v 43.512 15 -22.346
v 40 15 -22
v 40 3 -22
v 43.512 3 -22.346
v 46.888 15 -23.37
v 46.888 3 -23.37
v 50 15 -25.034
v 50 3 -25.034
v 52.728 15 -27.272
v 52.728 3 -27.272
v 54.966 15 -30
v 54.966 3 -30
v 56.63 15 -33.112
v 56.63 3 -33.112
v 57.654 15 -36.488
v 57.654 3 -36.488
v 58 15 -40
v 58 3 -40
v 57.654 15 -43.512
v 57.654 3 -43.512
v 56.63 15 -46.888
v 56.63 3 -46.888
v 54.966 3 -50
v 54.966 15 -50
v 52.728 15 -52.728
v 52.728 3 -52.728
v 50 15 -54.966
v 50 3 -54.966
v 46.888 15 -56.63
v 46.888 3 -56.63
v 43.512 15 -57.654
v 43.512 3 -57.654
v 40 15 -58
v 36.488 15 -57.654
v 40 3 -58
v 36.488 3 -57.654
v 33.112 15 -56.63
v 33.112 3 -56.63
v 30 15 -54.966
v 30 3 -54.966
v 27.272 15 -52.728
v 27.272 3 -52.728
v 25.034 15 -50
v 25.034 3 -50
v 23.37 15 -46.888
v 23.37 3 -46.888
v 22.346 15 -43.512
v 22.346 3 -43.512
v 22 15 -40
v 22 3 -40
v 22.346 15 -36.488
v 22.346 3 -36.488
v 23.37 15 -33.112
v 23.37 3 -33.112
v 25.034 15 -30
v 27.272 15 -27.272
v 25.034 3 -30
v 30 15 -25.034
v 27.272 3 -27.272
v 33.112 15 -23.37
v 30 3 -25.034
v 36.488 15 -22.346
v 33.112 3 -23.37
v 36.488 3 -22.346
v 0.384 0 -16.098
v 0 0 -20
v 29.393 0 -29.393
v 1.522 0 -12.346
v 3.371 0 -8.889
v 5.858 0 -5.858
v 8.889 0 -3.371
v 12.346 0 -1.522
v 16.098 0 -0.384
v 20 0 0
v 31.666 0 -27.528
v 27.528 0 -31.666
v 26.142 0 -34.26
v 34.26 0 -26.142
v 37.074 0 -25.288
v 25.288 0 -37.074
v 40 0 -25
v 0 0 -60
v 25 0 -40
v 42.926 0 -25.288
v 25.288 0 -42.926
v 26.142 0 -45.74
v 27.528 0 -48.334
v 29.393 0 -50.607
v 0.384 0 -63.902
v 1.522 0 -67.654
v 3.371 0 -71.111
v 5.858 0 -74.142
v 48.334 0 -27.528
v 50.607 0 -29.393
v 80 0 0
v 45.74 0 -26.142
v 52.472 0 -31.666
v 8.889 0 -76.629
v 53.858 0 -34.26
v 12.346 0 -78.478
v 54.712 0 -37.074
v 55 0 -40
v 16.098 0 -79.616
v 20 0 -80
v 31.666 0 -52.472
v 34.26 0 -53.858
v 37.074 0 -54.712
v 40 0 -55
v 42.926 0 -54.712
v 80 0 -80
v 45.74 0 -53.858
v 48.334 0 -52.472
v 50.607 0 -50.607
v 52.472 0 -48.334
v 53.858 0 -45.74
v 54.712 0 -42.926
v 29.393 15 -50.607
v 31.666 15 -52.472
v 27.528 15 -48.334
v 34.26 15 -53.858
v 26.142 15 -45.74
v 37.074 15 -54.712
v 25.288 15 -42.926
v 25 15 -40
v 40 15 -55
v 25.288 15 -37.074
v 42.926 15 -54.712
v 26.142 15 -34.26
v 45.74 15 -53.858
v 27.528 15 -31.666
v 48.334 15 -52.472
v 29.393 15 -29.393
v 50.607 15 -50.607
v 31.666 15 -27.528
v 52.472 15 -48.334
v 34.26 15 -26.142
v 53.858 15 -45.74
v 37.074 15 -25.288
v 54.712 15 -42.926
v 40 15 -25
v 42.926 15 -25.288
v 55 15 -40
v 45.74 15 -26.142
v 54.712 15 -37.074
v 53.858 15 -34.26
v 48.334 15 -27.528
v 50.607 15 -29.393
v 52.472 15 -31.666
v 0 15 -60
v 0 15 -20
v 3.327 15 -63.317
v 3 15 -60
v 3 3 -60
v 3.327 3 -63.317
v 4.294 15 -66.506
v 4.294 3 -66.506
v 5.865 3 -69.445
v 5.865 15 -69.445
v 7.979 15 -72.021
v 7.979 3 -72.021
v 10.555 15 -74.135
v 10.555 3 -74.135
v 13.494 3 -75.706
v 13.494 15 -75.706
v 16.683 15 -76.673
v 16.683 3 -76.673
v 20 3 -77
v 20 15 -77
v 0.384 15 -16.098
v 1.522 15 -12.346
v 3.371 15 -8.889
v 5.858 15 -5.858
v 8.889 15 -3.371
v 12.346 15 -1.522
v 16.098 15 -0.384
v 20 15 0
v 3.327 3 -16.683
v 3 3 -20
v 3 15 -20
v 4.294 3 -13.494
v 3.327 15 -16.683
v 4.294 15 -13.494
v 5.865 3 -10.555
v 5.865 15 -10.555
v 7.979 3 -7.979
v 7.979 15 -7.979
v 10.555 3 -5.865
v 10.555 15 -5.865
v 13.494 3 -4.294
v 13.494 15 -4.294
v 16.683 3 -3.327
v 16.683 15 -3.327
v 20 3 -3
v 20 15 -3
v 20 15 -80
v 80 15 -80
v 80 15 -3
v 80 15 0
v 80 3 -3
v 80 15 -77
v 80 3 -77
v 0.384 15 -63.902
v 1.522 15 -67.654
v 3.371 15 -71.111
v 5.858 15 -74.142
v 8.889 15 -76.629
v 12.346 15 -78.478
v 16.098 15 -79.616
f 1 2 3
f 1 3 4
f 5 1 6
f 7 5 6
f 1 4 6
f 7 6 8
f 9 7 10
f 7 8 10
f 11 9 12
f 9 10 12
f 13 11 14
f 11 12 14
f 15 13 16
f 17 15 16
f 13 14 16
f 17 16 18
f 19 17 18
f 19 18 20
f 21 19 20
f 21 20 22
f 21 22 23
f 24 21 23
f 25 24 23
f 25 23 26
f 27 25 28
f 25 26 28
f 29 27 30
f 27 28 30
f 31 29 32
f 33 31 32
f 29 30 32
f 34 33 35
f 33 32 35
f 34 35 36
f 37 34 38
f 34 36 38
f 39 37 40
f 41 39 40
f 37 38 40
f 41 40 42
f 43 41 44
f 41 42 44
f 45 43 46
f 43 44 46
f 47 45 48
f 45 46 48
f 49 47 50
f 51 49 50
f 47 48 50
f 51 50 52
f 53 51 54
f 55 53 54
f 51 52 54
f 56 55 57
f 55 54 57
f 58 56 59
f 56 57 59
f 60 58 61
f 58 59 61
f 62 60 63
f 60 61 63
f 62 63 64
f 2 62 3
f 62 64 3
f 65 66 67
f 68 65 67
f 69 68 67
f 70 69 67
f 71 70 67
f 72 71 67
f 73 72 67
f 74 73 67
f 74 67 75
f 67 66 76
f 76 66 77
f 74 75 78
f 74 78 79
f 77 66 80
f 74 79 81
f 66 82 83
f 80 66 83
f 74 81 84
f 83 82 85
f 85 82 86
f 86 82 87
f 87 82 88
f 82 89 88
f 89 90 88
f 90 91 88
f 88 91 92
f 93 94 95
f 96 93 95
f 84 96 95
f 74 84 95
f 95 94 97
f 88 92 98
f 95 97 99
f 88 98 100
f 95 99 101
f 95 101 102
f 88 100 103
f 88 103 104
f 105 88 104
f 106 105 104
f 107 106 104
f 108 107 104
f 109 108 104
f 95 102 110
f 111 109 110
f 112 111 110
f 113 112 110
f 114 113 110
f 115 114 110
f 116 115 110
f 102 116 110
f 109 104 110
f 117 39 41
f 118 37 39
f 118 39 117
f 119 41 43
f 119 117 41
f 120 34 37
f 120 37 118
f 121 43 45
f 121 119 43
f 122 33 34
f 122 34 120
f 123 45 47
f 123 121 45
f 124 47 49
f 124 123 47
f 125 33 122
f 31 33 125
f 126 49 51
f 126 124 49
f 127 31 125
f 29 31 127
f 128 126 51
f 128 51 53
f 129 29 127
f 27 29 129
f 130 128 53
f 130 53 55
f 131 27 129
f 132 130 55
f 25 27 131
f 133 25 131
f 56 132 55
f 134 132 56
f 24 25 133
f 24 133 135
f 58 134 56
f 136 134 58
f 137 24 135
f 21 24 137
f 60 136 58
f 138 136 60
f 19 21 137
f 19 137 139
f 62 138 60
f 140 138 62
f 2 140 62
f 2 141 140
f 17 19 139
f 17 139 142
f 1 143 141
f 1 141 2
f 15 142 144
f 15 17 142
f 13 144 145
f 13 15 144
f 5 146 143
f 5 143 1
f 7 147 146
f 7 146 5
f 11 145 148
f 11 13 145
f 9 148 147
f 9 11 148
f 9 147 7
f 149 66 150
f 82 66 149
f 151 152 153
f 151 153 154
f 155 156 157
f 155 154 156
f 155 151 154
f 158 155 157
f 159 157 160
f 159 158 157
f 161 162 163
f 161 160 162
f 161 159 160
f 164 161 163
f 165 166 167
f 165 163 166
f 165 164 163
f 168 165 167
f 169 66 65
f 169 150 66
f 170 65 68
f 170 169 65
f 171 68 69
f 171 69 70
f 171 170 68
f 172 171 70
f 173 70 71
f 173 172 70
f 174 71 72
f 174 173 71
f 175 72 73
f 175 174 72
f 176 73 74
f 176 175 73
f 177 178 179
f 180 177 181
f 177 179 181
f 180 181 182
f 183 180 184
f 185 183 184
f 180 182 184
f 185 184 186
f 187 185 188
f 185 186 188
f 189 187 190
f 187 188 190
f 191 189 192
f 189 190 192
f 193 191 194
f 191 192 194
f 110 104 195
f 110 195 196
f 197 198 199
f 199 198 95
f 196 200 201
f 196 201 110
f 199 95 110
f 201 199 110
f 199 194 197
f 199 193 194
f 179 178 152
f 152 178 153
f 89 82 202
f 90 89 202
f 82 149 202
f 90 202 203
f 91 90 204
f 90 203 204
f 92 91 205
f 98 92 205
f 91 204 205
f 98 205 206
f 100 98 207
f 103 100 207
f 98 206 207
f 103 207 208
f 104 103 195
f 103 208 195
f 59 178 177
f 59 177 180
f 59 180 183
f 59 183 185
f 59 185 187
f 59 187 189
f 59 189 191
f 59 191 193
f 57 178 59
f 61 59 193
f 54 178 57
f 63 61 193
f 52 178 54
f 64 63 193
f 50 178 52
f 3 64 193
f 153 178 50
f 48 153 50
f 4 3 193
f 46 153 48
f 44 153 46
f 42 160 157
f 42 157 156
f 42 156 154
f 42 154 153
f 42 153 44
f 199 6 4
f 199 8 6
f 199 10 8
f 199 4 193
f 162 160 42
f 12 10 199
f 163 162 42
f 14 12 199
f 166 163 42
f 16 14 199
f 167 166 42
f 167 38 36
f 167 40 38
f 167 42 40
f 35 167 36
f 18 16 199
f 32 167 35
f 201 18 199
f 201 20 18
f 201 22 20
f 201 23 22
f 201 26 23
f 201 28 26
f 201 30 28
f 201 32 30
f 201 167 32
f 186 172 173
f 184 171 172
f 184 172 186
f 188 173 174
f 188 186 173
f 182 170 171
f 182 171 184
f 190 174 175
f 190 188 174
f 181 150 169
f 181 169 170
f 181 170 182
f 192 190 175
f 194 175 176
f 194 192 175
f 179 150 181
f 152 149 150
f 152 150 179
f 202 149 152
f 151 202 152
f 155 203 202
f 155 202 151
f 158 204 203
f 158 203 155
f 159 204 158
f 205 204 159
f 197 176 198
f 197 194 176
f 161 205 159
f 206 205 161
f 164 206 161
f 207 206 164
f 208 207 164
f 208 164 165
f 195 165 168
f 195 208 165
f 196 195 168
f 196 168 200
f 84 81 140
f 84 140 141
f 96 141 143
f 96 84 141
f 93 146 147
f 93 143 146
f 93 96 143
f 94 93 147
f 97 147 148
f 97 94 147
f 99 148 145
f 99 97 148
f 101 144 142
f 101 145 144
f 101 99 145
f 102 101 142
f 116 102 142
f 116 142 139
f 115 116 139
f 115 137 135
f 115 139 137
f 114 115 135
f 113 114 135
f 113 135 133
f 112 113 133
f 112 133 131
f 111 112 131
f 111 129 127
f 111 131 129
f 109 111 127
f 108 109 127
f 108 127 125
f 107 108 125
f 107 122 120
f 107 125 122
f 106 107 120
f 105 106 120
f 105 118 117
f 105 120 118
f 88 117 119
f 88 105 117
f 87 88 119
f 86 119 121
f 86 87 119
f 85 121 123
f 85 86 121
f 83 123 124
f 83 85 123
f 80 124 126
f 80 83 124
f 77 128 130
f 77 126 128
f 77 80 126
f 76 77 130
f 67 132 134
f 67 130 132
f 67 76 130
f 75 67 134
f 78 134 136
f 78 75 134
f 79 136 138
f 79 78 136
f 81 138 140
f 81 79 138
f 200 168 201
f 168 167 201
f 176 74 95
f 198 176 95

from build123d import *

# Parameters (mm, degrees)
SKETCH_1_W               = 80
SKETCH_1_H               = 80
EXTRUDE_1_DEPTH          = 15
FILLET_1_R               = 20
SHELL_1_T                = -3
SKETCH_2_R               = 18
EXTRUDE_2_DEPTH          = 12
CUT_EXTRUDE_1_DEPTH      = 15
CUT_EXTRUDE_1_DEPTH_BACK = 15
SKETCH_2_3_R             = 15


with BuildPart() as part:
    # 스케치1 → 보스-돌출1 (new body)
    with BuildSketch(Plane(origin=(0, 0, 0), x_dir=(1, 0, 0), z_dir=(0, 1, 0))):
        with Locations((40, 40)):
            Rectangle(SKETCH_1_W, SKETCH_1_H)
    extrude(amount=EXTRUDE_1_DEPTH)

    # 필렛1
    fillet_1_edges = [part.edges().sort_by_distance(p)[0] for p in [
        (0, 7.5, -80),
        (0, 7.5, 0),
    ]]
    fillet(fillet_1_edges, radius=FILLET_1_R)

    # 쉘1
    shell_1_openings = [part.faces().sort_by_distance(p)[0] for p in [
        (80, 7.5, -40),
        (40.979445098, 15, -40),
    ]]
    offset(amount=SHELL_1_T, openings=shell_1_openings, kind=Kind.INTERSECTION)

    # 스케치2 → 보스-돌출2 (add)
    with BuildSketch(Plane(origin=(0, 3, 0), x_dir=(1, 0, 0), z_dir=(0, 1, 0))):
        with Locations((40, 40)):
            Circle(SKETCH_2_R)
    extrude(amount=EXTRUDE_2_DEPTH)

    # 스케치2<3> → 컷-돌출1 (cut, two sides: drawn at the far end of the back side and taken through both)
    with BuildSketch(Plane(origin=(0, 3, 0), x_dir=(1, 0, 0), z_dir=(0, 1, 0)).offset(-CUT_EXTRUDE_1_DEPTH_BACK)):
        with Locations((40, 40)):
            Circle(SKETCH_2_3_R)
    extrude(amount=CUT_EXTRUDE_1_DEPTH + CUT_EXTRUDE_1_DEPTH_BACK, mode=Mode.SUBTRACT)


solid = part.part
